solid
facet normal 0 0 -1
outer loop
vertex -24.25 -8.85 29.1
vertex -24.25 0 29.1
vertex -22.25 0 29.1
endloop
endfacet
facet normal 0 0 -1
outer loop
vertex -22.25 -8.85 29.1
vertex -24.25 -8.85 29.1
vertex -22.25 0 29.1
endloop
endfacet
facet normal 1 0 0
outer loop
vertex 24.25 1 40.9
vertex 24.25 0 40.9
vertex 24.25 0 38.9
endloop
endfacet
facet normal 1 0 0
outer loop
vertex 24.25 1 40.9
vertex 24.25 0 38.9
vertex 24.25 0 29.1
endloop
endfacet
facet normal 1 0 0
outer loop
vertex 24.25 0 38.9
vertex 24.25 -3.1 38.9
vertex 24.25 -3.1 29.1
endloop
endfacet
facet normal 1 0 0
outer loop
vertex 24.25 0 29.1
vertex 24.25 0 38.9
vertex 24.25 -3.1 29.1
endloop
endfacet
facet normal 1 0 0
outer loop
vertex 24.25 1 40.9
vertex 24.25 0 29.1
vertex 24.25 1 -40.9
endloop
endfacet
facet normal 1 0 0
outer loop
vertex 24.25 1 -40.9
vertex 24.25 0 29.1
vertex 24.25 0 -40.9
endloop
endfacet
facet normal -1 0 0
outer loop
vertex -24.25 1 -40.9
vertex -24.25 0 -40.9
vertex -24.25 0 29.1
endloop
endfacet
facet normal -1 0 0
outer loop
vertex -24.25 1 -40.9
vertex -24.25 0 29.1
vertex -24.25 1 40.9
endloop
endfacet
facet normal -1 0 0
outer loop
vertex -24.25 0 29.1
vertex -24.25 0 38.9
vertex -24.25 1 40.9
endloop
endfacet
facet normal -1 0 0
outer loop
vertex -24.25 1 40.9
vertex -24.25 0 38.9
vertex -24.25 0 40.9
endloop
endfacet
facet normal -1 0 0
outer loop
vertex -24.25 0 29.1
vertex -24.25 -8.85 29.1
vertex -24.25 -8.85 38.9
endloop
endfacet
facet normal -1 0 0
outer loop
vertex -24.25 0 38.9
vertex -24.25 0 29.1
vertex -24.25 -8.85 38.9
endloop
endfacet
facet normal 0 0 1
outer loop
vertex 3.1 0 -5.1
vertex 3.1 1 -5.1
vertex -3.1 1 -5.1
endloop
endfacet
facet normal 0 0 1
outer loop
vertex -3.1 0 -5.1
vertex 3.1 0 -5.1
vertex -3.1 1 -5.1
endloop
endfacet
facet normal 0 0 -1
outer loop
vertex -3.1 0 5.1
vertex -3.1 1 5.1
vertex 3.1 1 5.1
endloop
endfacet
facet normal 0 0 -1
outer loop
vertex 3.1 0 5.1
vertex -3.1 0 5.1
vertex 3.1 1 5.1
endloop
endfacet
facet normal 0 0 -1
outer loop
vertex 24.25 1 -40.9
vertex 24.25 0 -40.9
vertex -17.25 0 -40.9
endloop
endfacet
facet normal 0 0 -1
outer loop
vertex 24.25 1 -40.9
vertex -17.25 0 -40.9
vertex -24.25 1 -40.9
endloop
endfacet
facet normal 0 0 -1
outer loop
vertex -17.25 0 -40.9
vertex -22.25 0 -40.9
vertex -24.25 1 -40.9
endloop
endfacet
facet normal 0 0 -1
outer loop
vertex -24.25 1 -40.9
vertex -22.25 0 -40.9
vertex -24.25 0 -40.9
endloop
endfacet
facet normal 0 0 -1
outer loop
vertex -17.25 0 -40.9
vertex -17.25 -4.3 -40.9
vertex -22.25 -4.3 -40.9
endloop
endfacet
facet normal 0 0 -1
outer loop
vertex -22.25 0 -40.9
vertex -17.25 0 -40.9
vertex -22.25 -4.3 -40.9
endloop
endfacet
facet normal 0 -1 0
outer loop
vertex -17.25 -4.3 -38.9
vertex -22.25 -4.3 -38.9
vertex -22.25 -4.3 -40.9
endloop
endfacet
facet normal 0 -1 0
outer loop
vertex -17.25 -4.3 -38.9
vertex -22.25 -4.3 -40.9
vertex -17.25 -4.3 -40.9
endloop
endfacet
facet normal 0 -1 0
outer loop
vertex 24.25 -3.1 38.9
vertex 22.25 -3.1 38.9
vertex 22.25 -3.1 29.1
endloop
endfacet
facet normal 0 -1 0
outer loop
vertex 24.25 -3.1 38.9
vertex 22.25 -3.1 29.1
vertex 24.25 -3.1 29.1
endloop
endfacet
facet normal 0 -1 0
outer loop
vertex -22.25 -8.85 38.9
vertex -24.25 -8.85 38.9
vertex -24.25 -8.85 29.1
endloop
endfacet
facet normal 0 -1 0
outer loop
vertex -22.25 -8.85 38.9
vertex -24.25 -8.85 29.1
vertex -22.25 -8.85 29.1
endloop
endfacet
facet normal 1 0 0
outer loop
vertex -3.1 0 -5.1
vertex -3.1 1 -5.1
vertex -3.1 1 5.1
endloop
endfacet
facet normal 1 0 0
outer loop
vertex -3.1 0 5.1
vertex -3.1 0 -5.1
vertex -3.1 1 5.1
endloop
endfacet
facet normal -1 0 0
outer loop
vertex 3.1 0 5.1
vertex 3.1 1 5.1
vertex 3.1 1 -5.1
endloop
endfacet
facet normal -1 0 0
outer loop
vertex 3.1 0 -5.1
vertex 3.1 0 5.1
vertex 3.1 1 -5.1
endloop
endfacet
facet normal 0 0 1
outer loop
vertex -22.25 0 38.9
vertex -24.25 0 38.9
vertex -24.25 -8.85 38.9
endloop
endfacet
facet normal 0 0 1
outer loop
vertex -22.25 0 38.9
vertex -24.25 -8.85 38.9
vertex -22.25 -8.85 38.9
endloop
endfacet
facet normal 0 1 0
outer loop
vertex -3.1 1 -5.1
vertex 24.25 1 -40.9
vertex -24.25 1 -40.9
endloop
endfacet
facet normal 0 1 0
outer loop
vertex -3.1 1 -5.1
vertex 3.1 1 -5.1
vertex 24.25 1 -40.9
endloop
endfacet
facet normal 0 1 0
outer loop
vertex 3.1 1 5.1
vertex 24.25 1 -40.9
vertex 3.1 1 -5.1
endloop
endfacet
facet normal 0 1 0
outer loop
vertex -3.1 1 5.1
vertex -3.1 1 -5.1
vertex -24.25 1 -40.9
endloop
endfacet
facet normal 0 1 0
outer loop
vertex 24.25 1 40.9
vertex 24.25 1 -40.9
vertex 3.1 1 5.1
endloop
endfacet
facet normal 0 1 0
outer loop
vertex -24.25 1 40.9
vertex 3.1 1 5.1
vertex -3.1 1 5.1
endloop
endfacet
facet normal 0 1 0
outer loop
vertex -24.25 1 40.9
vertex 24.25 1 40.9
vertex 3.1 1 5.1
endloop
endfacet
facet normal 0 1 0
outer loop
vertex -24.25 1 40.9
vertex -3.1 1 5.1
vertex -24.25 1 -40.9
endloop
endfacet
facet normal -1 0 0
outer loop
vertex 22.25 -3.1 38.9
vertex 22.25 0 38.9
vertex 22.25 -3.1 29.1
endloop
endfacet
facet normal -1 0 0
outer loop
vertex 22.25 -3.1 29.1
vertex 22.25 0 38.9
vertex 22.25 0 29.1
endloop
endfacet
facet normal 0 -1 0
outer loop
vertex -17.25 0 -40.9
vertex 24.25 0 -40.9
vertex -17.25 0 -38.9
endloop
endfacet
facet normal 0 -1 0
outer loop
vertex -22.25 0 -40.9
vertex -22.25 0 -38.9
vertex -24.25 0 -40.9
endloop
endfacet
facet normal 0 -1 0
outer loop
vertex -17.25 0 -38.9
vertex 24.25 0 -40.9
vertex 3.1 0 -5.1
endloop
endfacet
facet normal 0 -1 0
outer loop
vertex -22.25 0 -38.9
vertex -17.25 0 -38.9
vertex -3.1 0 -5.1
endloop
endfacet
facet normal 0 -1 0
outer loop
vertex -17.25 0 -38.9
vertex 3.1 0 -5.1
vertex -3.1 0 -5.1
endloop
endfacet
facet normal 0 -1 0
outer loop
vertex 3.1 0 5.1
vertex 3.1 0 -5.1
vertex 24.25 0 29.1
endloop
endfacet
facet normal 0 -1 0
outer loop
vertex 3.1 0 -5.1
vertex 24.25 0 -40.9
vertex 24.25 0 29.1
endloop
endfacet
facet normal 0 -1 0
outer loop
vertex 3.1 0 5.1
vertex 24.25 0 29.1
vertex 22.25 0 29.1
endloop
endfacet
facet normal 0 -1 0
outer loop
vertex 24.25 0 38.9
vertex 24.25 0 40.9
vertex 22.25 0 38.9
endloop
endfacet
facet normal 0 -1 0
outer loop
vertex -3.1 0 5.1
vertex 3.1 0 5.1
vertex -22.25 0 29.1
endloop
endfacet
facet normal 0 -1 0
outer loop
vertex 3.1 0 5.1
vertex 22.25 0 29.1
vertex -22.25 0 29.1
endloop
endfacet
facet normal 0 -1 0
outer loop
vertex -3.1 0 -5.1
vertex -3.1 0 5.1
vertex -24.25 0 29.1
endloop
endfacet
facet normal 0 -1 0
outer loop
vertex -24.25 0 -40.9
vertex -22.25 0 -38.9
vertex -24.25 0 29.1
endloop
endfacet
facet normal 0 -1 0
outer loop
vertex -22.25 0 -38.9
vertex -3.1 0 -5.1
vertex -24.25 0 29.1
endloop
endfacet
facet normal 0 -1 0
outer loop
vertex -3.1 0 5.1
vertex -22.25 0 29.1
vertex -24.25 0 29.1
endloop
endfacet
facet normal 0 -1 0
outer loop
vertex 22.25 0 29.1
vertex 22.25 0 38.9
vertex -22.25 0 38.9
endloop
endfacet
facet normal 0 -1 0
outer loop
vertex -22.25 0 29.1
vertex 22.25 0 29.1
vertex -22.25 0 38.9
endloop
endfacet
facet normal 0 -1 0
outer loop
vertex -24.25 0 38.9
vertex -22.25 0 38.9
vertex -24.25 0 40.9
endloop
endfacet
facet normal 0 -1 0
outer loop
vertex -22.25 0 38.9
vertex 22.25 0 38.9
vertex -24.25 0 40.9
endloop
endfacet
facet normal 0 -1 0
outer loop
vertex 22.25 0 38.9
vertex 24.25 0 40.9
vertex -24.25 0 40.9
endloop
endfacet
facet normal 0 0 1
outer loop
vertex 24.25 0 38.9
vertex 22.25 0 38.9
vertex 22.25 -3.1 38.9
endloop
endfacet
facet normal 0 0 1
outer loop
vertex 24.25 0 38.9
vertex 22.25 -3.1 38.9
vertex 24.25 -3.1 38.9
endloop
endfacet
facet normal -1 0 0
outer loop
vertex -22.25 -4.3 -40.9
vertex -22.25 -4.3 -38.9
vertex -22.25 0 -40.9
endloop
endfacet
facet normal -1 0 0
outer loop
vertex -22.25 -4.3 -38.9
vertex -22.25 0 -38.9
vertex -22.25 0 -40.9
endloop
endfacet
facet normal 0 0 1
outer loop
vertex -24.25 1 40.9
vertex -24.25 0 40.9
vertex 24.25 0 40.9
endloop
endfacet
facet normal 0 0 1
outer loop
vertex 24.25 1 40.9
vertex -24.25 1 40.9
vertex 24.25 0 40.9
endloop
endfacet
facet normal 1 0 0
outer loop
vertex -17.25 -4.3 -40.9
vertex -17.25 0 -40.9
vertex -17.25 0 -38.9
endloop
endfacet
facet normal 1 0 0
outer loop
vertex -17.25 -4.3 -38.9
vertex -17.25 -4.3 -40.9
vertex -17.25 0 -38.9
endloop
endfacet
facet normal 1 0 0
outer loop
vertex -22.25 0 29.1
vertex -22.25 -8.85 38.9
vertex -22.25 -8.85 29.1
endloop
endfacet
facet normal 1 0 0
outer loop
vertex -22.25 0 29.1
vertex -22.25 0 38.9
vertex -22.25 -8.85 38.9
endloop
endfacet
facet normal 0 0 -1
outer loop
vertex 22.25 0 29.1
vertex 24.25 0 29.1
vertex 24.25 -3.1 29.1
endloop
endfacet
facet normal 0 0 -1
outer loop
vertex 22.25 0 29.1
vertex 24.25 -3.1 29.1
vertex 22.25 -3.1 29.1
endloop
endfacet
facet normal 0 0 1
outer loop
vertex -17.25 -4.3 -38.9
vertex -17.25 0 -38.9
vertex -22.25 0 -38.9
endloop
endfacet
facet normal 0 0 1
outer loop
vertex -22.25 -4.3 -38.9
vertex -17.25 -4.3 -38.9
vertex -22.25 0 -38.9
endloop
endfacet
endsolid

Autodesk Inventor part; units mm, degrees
ref_plane "YZ Plane" through (0, 0, 0) normal (1, 0, 0) x (0, 1, 0)
ref_plane "XZ Plane" through (0, 0, 0) normal (0, 1, 0) x (-1, 0, 0)
ref_plane "XY Plane" through (0, 0, 0) normal (0, 0, 1) x (1, 0, 0)
sketch "Boceto1" plane through (0, 0, 0) normal (0, 1, 0) x (-1, 0, 0)
  line L0 (-24.25, -40.9) -> (24.25, -40.9)
  line L1 (24.25, -40.9) -> (24.25, 40.9)
  line L2 (24.25, 40.9) -> (-24.25, 40.9)
  line L3 (-24.25, 40.9) -> (-24.25, -40.9)
  line L4 (-24.25, -40.9) -> (24.25, 40.9) construction
  line L5 (24.25, -40.9) -> (-24.25, 40.9) construction
  point P0 (0, 0)
  dimension "d0" = 48.5
  dimension "d1" = 81.8
extrude "Extrusión1" add sketch "Boceto1" along normal blind 1
sketch "Boceto2" plane through (0, 1, 0) normal (0, 1, 0) x (1, 0, 0)
  line L0 (3.1, 5.1) -> (-3.1, 5.1)
  line L1 (-3.1, 5.1) -> (-3.1, -5.1)
  line L2 (-3.1, -5.1) -> (3.1, -5.1)
  line L3 (3.1, -5.1) -> (3.1, 5.1)
  line L4 (3.1, 5.1) -> (-3.1, -5.1) construction
  line L5 (-3.1, 5.1) -> (3.1, -5.1) construction
  point P0 (0, 0)
  dimension "d4" = 6.2
  dimension "d5" = 10.2
extrude "Extrusión2" cut sketch "Boceto2" against normal blind 1
sketch "Boceto3" plane through (0, 0, 0) normal (0, -1, 0) x (1, 0, 0)
  line L0 (-22.25, -40.9) -> (-17.25, -40.9) projected
  line L1 (-17.25, -38.9) -> (-22.25, -38.9) projected
  line L2 (-17.25, -40.9) -> (-17.25, -38.9) projected
  line L3 (-22.25, 29.1) -> (-22.25, -40.9) projected
  line L4 (-22.25, 29.1) -> (-24.25, 29.1) projected
  line L5 (22.25, 38.9) -> (-24.25, 38.9) projected
  line L6 (-24.25, 29.1) -> (32.137, 29.1)
  line L7 (32.137, 29.1) -> (32.137, 38.9)
  line L8 (32.137, 38.9) -> (-24.25, 38.9)
  line L9 (-24.25, 38.9) -> (-24.25, 29.1)
  line L10 (-17.25, -40.9) -> (-22.25, -40.9)
  line L11 (-22.25, -40.9) -> (-22.25, -38.9)
  line L12 (-22.25, -38.9) -> (-17.25, -38.9)
  line L13 (-17.25, -38.9) -> (-17.25, -40.9)
  point P0 (0, 0)
extrude "Extrusión3" add sketch "Boceto3" along normal blind 4.3 contours L3 L1 L2 L0
sketch "Boceto4" plane through (0, 0, 0) normal (0, -1, 0) x (1, 0, 0)
  line L0 (-24.25, 29.1) -> (-22.25, 29.1) projected
  line L1 (-24.25, -40.9) -> (-24.25, 40.9) projected
  line L2 (-22.25, 29.1) -> (-24.25, 29.1)
  line L3 (-24.25, 29.1) -> (-24.25, 40.9)
  line L4 (-24.25, 40.9) -> (-22.25, 40.9)
  line L5 (-22.25, 40.9) -> (-22.25, 29.1)
  line L6 (-24.25, 38.9) -> (22.25, 38.9) projected
  point P0 (0, 0)
  point P1 (-22.25, 38.9)
extrude "Extrusión4" add sketch "Boceto4" along normal blind 8.85 contours L1 L6 L5 L0
sketch "Boceto5" plane through (0, 0, 0) normal (0, -1, 0) x (1, 0, 0)
  line L0 (24.25, -40.9) -> (24.25, 40.9) projected
  line L1 (24.25, 40.9) -> (-24.25, 40.9) projected
  line L2 (22.25, 38.9) -> (22.25, 29.1) projected
  line L3 (-24.25, 38.9) -> (22.25, 38.9) projected
  line L4 (22.25, 29.1) -> (-17.25, 29.1) projected
  line L5 (22.25, 38.9) -> (24.25, 38.9)
  line L6 (24.25, 38.9) -> (24.25, 29.1)
  line L7 (24.25, 29.1) -> (22.25, 29.1)
  line L8 (22.25, 29.1) -> (22.25, 38.9)
  point P0 (0, 0)
extrude "Extrusión5" add sketch "Boceto5" along normal blind 3.1
properties part number "TapaBaterias"
